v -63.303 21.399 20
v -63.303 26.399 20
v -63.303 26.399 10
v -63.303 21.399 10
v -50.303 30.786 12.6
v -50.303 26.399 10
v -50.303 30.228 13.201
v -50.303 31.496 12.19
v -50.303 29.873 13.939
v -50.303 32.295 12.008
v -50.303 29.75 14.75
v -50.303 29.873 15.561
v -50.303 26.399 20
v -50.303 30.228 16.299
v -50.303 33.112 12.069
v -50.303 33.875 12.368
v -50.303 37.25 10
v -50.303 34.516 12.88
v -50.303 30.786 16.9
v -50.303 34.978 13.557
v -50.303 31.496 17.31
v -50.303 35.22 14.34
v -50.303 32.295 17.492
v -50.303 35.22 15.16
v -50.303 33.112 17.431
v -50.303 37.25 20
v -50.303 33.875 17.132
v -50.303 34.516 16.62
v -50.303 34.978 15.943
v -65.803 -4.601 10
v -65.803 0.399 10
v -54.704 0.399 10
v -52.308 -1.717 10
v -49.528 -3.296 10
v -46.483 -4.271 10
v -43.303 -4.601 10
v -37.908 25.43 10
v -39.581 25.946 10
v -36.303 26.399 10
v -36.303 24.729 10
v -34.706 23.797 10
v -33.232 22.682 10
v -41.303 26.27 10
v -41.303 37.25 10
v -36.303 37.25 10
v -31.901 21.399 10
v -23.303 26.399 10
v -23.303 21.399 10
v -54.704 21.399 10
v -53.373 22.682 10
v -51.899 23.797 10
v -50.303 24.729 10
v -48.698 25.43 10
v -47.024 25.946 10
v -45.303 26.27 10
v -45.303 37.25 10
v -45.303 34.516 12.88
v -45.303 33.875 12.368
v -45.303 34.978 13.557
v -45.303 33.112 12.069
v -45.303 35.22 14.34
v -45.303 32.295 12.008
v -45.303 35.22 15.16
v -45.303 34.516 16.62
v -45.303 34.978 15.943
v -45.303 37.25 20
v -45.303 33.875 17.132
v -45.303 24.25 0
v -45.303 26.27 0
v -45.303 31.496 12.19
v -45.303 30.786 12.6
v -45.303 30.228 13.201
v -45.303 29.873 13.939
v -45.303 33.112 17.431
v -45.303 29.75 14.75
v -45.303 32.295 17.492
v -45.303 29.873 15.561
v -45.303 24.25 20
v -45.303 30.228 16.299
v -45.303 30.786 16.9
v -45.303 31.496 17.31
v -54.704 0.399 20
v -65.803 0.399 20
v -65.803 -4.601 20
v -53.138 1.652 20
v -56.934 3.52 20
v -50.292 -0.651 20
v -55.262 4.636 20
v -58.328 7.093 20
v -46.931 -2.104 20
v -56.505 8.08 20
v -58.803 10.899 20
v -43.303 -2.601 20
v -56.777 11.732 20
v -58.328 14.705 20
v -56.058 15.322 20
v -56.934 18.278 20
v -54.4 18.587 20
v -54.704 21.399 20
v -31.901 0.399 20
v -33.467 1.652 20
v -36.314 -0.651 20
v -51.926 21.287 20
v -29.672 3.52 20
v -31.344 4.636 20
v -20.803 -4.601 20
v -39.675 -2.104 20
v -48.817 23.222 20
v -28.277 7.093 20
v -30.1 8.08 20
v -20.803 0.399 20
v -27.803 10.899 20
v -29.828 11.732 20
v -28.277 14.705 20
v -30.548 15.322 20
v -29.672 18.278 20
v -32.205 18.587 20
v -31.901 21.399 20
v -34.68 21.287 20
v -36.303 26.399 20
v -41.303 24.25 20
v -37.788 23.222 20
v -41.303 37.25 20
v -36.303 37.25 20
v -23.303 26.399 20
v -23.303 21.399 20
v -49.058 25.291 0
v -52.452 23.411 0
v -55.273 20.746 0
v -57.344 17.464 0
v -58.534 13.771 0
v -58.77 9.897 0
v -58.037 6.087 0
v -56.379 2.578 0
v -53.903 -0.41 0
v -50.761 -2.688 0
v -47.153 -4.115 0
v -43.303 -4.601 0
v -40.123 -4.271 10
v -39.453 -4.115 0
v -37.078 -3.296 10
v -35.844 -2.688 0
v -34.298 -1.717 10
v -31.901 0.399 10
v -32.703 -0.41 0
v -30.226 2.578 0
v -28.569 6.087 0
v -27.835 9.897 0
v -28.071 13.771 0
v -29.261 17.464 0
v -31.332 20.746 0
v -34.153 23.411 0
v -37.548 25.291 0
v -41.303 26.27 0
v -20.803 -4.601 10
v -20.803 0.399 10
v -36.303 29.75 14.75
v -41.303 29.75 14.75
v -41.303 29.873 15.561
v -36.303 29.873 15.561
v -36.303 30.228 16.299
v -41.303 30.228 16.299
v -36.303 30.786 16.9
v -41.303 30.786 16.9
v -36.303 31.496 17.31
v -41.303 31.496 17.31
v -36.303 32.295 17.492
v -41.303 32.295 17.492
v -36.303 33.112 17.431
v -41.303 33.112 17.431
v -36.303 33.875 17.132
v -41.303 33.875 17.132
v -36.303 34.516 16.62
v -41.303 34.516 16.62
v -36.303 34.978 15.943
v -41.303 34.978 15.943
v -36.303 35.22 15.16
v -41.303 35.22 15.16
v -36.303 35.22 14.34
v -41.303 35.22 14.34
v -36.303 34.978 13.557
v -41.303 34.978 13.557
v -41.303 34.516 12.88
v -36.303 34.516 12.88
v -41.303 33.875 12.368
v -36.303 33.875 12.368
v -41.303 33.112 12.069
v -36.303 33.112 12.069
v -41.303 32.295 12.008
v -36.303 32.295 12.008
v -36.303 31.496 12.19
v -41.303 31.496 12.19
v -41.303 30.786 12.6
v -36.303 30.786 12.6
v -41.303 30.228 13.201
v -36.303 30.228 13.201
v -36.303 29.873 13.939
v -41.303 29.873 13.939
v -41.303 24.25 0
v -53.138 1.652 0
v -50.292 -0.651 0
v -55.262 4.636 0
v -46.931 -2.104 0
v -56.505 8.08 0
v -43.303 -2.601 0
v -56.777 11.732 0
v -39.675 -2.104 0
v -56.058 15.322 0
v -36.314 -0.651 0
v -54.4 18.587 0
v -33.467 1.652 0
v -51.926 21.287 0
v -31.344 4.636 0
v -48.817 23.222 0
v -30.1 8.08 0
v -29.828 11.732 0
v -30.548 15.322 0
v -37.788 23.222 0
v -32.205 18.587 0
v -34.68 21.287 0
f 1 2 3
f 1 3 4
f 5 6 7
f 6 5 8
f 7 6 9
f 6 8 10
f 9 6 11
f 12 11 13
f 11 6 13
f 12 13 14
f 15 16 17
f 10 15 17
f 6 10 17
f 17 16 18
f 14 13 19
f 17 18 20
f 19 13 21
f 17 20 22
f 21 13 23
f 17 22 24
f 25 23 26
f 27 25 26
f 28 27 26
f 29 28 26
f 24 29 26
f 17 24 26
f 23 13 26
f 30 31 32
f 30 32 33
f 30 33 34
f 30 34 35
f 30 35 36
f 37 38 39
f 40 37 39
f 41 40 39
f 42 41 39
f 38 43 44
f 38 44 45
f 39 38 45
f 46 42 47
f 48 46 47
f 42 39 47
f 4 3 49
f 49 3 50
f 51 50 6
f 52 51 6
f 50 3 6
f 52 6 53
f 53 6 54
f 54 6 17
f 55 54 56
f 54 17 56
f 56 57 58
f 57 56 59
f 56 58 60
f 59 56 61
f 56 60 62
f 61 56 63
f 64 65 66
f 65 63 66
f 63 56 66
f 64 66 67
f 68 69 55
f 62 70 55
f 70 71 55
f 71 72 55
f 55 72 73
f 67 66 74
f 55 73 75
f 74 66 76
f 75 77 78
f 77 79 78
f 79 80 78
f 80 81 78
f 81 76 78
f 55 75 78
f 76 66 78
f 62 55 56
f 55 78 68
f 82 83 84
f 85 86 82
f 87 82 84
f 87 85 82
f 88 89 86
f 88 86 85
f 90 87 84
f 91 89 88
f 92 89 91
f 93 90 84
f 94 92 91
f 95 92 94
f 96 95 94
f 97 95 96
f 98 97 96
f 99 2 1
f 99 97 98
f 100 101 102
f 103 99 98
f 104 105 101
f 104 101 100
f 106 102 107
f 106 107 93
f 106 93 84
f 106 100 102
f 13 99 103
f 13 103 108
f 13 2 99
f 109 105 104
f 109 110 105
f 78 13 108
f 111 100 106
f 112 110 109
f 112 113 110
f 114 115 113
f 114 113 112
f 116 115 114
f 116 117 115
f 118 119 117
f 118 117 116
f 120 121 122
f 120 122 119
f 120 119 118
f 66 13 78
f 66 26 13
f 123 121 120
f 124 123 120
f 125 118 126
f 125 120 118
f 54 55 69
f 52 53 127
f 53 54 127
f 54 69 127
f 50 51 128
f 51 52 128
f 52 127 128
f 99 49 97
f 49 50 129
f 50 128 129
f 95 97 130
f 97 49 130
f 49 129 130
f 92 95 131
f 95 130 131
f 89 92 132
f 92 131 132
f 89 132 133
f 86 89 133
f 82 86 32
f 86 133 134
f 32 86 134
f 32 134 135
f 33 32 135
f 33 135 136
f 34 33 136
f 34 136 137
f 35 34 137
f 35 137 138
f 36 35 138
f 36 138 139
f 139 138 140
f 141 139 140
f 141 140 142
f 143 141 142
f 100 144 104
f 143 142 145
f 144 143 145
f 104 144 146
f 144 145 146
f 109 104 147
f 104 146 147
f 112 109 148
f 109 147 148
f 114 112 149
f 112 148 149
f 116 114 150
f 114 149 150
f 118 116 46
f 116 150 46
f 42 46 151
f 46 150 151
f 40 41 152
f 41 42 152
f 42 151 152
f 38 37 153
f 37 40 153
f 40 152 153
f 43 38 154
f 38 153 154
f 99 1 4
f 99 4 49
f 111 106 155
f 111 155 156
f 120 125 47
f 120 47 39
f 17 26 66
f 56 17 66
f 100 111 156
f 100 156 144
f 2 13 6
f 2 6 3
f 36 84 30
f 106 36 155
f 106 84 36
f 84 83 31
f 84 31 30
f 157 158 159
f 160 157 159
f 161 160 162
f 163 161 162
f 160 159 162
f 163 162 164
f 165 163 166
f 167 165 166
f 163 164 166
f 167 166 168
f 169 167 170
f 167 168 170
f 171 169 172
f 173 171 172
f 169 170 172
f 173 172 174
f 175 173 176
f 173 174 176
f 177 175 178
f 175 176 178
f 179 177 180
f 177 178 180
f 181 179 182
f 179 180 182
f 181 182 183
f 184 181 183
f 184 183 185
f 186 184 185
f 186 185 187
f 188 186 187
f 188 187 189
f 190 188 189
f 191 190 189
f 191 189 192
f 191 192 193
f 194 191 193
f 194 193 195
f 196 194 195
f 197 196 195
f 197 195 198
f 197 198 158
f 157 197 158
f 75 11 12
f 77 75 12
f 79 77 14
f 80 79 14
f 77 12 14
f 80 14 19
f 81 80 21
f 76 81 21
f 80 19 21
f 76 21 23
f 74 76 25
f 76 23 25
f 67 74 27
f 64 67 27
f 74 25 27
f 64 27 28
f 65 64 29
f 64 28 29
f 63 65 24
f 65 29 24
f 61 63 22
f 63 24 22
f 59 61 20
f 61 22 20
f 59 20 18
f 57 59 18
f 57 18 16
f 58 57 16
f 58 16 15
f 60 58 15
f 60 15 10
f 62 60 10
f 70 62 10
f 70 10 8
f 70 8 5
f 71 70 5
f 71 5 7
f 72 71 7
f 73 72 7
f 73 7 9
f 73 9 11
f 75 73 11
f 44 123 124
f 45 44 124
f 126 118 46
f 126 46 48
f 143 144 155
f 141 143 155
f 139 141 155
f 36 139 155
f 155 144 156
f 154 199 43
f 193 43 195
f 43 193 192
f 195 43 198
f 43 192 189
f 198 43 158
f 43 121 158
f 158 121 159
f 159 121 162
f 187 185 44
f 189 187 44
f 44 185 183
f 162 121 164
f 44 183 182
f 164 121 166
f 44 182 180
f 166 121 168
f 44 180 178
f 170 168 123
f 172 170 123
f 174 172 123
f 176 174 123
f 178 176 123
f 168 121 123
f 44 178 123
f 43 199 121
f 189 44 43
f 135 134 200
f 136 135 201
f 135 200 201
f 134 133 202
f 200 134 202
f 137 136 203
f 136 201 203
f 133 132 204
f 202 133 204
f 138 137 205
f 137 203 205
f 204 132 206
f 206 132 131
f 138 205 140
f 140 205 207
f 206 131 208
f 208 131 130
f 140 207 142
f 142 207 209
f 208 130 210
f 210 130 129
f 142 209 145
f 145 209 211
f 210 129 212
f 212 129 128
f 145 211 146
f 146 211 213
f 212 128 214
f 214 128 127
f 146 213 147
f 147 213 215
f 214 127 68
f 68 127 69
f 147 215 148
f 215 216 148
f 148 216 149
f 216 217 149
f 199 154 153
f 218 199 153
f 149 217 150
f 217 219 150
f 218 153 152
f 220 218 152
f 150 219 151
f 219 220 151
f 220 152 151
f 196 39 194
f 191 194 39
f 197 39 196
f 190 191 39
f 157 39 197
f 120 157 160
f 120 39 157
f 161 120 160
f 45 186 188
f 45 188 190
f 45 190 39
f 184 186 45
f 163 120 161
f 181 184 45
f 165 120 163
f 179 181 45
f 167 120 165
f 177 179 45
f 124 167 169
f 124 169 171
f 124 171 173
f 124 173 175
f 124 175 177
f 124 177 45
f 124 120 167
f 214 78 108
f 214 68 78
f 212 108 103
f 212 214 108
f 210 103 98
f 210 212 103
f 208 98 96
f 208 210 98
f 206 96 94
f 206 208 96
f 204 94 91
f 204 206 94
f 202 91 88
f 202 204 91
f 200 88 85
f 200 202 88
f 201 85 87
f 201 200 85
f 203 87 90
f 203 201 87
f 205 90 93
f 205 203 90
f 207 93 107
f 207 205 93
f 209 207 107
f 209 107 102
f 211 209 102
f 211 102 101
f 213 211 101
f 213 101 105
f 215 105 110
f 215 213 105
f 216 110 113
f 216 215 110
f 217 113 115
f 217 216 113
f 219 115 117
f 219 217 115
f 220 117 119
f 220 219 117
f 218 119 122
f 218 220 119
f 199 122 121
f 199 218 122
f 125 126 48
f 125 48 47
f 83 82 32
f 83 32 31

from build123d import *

# Parameters (mm, degrees)
F0_R     = 15.5
F0_R_2   = 13.5
F1_DEPTH = 20
F2_W     = 5
F2_H     = 10.8510299228
F3_DEPTH = 10
F5_DEPTH = 25
F6_R     = 2.75
F7_DEPTH = 15


with BuildPart() as f1:
    # F0 (on Top) → F1 (new body)
    with BuildSketch(Plane.XY):
        with Locations((-43.3026812971, 10.8993155882)):
            Circle(F0_R)
        with Locations((-43.3026812971, 10.8993155882)):
            Circle(F0_R_2, mode=Mode.SUBTRACT)
    extrude(amount=F1_DEPTH)

    # F2 (on face) → F3 (join)
    with BuildSketch(Plane.XY.offset(20)):
        with Locations((-47.8026812971, 31.8248305496)):
            Rectangle(F2_W, F2_H)
        with Locations((-38.8026812971, 31.8248305496)):
            Rectangle(F2_W, F2_H)
        with BuildLine():
            Line((-50.3026812971, 24.7286322741), (-50.3026812971, 26.3993155882))
            Line((-50.3026812971, 26.3993155882), (-63.3026812971, 26.3993155882))
            Line((-63.3026812971, 26.3993155882), (-63.3026812971, 21.3993155882))
            Line((-63.3026812971, 21.3993155882), (-54.7044355481, 21.3993155882))
            ThreePointArc((-54.7044355481, 21.3993155882), (-52.6529340892, 23.2614664012), (-50.3026812971, 24.7286322741))
        make_face()
        with BuildLine():
            Line((-23.3026812971, 26.3993155882), (-36.3026812971, 26.3993155882))
            Line((-36.3026812971, 26.3993155882), (-36.3026812971, 24.7286322741))
            ThreePointArc((-36.3026812971, 24.7286322741), (-33.9524285049, 23.2614664012), (-31.9009270461, 21.3993155882))
            Line((-31.9009270461, 21.3993155882), (-23.3026812971, 21.3993155882))
            Line((-23.3026812971, 21.3993155882), (-23.3026812971, 26.3993155882))
        make_face()
        with BuildLine():
            Line((-45.3026812971, 26.2697417371), (-45.3026812971, 26.3993155882))
            Line((-45.3026812971, 26.3993155882), (-50.3026812971, 26.3993155882))
            Line((-50.3026812971, 26.3993155882), (-50.3026812971, 24.7286322741))
            ThreePointArc((-50.3026812971, 24.7286322741), (-47.8681773921, 25.711683576), (-45.3026812971, 26.2697417371))
        make_face()
        with BuildLine():
            Line((-36.3026812971, 26.3993155882), (-41.3026812971, 26.3993155882))
            Line((-41.3026812971, 26.3993155882), (-41.3026812971, 26.2697417371))
            ThreePointArc((-41.3026812971, 26.2697417371), (-38.737185202, 25.711683576), (-36.3026812971, 24.7286322741))
            Line((-36.3026812971, 24.7286322741), (-36.3026812971, 26.3993155882))
        make_face()
        with BuildLine():
            ThreePointArc((-43.3026812971, -4.6006844118), (-49.5276310961, -3.2957539784), (-54.7044355481, 0.3993155882))
            Line((-54.7044355481, 0.3993155882), (-65.8026812971, 0.3993155882))
            Line((-65.8026812971, 0.3993155882), (-65.8026812971, -4.6006844118))
            Line((-65.8026812971, -4.6006844118), (-43.3026812971, -4.6006844118))
        make_face()
        with BuildLine():
            ThreePointArc((-31.9009270461, 0.3993155882), (-37.0777314981, -3.2957539784), (-43.3026812971, -4.6006844118))
            Line((-43.3026812971, -4.6006844118), (-20.8026812971, -4.6006844118))
            Line((-20.8026812971, -4.6006844118), (-20.8026812971, 0.3993155882))
            Line((-20.8026812971, 0.3993155882), (-31.9009270461, 0.3993155882))
        make_face()
    extrude(amount=-F3_DEPTH)

    # F4 (on face) → F5 (cut)
    with BuildSketch(Plane.XY.offset(20)):
        with BuildLine():
            Line((-41.3026812971, 27.4977236986), (-45.3026812971, 27.4977236986))
            Line((-45.3026812971, 27.4977236986), (-45.3026812971, 26.2697417371))
            ThreePointArc((-45.3026812971, 26.2697417371), (-43.3026812971, 26.3993155882), (-41.3026812971, 26.2697417371))
            Line((-41.3026812971, 26.2697417371), (-41.3026812971, 27.4977236986))
        make_face()
        with BuildLine():
            ThreePointArc((-41.3026812971, 26.2697417371), (-43.3026812971, 26.3993155882), (-45.3026812971, 26.2697417371))
            Line((-45.3026812971, 26.2697417371), (-45.3026812971, 24.250345511))
            ThreePointArc((-45.3026812971, 24.250345511), (-43.3026812971, 24.3993155882), (-41.3026812971, 24.250345511))
            Line((-41.3026812971, 24.250345511), (-41.3026812971, 26.2697417371))
        make_face()
    extrude(amount=-F5_DEPTH, mode=Mode.SUBTRACT)

    # F6 (on face) → F7 (cut)
    with BuildSketch(Plane(origin=(-50.3026812971, 0, 0), x_dir=(0, -1, 0), z_dir=(-1, 0, 0))):
        with Locations((-32.500345511, 14.75)):
            Circle(F6_R)
    extrude(amount=-F7_DEPTH, mode=Mode.SUBTRACT)


solid = f1.part
